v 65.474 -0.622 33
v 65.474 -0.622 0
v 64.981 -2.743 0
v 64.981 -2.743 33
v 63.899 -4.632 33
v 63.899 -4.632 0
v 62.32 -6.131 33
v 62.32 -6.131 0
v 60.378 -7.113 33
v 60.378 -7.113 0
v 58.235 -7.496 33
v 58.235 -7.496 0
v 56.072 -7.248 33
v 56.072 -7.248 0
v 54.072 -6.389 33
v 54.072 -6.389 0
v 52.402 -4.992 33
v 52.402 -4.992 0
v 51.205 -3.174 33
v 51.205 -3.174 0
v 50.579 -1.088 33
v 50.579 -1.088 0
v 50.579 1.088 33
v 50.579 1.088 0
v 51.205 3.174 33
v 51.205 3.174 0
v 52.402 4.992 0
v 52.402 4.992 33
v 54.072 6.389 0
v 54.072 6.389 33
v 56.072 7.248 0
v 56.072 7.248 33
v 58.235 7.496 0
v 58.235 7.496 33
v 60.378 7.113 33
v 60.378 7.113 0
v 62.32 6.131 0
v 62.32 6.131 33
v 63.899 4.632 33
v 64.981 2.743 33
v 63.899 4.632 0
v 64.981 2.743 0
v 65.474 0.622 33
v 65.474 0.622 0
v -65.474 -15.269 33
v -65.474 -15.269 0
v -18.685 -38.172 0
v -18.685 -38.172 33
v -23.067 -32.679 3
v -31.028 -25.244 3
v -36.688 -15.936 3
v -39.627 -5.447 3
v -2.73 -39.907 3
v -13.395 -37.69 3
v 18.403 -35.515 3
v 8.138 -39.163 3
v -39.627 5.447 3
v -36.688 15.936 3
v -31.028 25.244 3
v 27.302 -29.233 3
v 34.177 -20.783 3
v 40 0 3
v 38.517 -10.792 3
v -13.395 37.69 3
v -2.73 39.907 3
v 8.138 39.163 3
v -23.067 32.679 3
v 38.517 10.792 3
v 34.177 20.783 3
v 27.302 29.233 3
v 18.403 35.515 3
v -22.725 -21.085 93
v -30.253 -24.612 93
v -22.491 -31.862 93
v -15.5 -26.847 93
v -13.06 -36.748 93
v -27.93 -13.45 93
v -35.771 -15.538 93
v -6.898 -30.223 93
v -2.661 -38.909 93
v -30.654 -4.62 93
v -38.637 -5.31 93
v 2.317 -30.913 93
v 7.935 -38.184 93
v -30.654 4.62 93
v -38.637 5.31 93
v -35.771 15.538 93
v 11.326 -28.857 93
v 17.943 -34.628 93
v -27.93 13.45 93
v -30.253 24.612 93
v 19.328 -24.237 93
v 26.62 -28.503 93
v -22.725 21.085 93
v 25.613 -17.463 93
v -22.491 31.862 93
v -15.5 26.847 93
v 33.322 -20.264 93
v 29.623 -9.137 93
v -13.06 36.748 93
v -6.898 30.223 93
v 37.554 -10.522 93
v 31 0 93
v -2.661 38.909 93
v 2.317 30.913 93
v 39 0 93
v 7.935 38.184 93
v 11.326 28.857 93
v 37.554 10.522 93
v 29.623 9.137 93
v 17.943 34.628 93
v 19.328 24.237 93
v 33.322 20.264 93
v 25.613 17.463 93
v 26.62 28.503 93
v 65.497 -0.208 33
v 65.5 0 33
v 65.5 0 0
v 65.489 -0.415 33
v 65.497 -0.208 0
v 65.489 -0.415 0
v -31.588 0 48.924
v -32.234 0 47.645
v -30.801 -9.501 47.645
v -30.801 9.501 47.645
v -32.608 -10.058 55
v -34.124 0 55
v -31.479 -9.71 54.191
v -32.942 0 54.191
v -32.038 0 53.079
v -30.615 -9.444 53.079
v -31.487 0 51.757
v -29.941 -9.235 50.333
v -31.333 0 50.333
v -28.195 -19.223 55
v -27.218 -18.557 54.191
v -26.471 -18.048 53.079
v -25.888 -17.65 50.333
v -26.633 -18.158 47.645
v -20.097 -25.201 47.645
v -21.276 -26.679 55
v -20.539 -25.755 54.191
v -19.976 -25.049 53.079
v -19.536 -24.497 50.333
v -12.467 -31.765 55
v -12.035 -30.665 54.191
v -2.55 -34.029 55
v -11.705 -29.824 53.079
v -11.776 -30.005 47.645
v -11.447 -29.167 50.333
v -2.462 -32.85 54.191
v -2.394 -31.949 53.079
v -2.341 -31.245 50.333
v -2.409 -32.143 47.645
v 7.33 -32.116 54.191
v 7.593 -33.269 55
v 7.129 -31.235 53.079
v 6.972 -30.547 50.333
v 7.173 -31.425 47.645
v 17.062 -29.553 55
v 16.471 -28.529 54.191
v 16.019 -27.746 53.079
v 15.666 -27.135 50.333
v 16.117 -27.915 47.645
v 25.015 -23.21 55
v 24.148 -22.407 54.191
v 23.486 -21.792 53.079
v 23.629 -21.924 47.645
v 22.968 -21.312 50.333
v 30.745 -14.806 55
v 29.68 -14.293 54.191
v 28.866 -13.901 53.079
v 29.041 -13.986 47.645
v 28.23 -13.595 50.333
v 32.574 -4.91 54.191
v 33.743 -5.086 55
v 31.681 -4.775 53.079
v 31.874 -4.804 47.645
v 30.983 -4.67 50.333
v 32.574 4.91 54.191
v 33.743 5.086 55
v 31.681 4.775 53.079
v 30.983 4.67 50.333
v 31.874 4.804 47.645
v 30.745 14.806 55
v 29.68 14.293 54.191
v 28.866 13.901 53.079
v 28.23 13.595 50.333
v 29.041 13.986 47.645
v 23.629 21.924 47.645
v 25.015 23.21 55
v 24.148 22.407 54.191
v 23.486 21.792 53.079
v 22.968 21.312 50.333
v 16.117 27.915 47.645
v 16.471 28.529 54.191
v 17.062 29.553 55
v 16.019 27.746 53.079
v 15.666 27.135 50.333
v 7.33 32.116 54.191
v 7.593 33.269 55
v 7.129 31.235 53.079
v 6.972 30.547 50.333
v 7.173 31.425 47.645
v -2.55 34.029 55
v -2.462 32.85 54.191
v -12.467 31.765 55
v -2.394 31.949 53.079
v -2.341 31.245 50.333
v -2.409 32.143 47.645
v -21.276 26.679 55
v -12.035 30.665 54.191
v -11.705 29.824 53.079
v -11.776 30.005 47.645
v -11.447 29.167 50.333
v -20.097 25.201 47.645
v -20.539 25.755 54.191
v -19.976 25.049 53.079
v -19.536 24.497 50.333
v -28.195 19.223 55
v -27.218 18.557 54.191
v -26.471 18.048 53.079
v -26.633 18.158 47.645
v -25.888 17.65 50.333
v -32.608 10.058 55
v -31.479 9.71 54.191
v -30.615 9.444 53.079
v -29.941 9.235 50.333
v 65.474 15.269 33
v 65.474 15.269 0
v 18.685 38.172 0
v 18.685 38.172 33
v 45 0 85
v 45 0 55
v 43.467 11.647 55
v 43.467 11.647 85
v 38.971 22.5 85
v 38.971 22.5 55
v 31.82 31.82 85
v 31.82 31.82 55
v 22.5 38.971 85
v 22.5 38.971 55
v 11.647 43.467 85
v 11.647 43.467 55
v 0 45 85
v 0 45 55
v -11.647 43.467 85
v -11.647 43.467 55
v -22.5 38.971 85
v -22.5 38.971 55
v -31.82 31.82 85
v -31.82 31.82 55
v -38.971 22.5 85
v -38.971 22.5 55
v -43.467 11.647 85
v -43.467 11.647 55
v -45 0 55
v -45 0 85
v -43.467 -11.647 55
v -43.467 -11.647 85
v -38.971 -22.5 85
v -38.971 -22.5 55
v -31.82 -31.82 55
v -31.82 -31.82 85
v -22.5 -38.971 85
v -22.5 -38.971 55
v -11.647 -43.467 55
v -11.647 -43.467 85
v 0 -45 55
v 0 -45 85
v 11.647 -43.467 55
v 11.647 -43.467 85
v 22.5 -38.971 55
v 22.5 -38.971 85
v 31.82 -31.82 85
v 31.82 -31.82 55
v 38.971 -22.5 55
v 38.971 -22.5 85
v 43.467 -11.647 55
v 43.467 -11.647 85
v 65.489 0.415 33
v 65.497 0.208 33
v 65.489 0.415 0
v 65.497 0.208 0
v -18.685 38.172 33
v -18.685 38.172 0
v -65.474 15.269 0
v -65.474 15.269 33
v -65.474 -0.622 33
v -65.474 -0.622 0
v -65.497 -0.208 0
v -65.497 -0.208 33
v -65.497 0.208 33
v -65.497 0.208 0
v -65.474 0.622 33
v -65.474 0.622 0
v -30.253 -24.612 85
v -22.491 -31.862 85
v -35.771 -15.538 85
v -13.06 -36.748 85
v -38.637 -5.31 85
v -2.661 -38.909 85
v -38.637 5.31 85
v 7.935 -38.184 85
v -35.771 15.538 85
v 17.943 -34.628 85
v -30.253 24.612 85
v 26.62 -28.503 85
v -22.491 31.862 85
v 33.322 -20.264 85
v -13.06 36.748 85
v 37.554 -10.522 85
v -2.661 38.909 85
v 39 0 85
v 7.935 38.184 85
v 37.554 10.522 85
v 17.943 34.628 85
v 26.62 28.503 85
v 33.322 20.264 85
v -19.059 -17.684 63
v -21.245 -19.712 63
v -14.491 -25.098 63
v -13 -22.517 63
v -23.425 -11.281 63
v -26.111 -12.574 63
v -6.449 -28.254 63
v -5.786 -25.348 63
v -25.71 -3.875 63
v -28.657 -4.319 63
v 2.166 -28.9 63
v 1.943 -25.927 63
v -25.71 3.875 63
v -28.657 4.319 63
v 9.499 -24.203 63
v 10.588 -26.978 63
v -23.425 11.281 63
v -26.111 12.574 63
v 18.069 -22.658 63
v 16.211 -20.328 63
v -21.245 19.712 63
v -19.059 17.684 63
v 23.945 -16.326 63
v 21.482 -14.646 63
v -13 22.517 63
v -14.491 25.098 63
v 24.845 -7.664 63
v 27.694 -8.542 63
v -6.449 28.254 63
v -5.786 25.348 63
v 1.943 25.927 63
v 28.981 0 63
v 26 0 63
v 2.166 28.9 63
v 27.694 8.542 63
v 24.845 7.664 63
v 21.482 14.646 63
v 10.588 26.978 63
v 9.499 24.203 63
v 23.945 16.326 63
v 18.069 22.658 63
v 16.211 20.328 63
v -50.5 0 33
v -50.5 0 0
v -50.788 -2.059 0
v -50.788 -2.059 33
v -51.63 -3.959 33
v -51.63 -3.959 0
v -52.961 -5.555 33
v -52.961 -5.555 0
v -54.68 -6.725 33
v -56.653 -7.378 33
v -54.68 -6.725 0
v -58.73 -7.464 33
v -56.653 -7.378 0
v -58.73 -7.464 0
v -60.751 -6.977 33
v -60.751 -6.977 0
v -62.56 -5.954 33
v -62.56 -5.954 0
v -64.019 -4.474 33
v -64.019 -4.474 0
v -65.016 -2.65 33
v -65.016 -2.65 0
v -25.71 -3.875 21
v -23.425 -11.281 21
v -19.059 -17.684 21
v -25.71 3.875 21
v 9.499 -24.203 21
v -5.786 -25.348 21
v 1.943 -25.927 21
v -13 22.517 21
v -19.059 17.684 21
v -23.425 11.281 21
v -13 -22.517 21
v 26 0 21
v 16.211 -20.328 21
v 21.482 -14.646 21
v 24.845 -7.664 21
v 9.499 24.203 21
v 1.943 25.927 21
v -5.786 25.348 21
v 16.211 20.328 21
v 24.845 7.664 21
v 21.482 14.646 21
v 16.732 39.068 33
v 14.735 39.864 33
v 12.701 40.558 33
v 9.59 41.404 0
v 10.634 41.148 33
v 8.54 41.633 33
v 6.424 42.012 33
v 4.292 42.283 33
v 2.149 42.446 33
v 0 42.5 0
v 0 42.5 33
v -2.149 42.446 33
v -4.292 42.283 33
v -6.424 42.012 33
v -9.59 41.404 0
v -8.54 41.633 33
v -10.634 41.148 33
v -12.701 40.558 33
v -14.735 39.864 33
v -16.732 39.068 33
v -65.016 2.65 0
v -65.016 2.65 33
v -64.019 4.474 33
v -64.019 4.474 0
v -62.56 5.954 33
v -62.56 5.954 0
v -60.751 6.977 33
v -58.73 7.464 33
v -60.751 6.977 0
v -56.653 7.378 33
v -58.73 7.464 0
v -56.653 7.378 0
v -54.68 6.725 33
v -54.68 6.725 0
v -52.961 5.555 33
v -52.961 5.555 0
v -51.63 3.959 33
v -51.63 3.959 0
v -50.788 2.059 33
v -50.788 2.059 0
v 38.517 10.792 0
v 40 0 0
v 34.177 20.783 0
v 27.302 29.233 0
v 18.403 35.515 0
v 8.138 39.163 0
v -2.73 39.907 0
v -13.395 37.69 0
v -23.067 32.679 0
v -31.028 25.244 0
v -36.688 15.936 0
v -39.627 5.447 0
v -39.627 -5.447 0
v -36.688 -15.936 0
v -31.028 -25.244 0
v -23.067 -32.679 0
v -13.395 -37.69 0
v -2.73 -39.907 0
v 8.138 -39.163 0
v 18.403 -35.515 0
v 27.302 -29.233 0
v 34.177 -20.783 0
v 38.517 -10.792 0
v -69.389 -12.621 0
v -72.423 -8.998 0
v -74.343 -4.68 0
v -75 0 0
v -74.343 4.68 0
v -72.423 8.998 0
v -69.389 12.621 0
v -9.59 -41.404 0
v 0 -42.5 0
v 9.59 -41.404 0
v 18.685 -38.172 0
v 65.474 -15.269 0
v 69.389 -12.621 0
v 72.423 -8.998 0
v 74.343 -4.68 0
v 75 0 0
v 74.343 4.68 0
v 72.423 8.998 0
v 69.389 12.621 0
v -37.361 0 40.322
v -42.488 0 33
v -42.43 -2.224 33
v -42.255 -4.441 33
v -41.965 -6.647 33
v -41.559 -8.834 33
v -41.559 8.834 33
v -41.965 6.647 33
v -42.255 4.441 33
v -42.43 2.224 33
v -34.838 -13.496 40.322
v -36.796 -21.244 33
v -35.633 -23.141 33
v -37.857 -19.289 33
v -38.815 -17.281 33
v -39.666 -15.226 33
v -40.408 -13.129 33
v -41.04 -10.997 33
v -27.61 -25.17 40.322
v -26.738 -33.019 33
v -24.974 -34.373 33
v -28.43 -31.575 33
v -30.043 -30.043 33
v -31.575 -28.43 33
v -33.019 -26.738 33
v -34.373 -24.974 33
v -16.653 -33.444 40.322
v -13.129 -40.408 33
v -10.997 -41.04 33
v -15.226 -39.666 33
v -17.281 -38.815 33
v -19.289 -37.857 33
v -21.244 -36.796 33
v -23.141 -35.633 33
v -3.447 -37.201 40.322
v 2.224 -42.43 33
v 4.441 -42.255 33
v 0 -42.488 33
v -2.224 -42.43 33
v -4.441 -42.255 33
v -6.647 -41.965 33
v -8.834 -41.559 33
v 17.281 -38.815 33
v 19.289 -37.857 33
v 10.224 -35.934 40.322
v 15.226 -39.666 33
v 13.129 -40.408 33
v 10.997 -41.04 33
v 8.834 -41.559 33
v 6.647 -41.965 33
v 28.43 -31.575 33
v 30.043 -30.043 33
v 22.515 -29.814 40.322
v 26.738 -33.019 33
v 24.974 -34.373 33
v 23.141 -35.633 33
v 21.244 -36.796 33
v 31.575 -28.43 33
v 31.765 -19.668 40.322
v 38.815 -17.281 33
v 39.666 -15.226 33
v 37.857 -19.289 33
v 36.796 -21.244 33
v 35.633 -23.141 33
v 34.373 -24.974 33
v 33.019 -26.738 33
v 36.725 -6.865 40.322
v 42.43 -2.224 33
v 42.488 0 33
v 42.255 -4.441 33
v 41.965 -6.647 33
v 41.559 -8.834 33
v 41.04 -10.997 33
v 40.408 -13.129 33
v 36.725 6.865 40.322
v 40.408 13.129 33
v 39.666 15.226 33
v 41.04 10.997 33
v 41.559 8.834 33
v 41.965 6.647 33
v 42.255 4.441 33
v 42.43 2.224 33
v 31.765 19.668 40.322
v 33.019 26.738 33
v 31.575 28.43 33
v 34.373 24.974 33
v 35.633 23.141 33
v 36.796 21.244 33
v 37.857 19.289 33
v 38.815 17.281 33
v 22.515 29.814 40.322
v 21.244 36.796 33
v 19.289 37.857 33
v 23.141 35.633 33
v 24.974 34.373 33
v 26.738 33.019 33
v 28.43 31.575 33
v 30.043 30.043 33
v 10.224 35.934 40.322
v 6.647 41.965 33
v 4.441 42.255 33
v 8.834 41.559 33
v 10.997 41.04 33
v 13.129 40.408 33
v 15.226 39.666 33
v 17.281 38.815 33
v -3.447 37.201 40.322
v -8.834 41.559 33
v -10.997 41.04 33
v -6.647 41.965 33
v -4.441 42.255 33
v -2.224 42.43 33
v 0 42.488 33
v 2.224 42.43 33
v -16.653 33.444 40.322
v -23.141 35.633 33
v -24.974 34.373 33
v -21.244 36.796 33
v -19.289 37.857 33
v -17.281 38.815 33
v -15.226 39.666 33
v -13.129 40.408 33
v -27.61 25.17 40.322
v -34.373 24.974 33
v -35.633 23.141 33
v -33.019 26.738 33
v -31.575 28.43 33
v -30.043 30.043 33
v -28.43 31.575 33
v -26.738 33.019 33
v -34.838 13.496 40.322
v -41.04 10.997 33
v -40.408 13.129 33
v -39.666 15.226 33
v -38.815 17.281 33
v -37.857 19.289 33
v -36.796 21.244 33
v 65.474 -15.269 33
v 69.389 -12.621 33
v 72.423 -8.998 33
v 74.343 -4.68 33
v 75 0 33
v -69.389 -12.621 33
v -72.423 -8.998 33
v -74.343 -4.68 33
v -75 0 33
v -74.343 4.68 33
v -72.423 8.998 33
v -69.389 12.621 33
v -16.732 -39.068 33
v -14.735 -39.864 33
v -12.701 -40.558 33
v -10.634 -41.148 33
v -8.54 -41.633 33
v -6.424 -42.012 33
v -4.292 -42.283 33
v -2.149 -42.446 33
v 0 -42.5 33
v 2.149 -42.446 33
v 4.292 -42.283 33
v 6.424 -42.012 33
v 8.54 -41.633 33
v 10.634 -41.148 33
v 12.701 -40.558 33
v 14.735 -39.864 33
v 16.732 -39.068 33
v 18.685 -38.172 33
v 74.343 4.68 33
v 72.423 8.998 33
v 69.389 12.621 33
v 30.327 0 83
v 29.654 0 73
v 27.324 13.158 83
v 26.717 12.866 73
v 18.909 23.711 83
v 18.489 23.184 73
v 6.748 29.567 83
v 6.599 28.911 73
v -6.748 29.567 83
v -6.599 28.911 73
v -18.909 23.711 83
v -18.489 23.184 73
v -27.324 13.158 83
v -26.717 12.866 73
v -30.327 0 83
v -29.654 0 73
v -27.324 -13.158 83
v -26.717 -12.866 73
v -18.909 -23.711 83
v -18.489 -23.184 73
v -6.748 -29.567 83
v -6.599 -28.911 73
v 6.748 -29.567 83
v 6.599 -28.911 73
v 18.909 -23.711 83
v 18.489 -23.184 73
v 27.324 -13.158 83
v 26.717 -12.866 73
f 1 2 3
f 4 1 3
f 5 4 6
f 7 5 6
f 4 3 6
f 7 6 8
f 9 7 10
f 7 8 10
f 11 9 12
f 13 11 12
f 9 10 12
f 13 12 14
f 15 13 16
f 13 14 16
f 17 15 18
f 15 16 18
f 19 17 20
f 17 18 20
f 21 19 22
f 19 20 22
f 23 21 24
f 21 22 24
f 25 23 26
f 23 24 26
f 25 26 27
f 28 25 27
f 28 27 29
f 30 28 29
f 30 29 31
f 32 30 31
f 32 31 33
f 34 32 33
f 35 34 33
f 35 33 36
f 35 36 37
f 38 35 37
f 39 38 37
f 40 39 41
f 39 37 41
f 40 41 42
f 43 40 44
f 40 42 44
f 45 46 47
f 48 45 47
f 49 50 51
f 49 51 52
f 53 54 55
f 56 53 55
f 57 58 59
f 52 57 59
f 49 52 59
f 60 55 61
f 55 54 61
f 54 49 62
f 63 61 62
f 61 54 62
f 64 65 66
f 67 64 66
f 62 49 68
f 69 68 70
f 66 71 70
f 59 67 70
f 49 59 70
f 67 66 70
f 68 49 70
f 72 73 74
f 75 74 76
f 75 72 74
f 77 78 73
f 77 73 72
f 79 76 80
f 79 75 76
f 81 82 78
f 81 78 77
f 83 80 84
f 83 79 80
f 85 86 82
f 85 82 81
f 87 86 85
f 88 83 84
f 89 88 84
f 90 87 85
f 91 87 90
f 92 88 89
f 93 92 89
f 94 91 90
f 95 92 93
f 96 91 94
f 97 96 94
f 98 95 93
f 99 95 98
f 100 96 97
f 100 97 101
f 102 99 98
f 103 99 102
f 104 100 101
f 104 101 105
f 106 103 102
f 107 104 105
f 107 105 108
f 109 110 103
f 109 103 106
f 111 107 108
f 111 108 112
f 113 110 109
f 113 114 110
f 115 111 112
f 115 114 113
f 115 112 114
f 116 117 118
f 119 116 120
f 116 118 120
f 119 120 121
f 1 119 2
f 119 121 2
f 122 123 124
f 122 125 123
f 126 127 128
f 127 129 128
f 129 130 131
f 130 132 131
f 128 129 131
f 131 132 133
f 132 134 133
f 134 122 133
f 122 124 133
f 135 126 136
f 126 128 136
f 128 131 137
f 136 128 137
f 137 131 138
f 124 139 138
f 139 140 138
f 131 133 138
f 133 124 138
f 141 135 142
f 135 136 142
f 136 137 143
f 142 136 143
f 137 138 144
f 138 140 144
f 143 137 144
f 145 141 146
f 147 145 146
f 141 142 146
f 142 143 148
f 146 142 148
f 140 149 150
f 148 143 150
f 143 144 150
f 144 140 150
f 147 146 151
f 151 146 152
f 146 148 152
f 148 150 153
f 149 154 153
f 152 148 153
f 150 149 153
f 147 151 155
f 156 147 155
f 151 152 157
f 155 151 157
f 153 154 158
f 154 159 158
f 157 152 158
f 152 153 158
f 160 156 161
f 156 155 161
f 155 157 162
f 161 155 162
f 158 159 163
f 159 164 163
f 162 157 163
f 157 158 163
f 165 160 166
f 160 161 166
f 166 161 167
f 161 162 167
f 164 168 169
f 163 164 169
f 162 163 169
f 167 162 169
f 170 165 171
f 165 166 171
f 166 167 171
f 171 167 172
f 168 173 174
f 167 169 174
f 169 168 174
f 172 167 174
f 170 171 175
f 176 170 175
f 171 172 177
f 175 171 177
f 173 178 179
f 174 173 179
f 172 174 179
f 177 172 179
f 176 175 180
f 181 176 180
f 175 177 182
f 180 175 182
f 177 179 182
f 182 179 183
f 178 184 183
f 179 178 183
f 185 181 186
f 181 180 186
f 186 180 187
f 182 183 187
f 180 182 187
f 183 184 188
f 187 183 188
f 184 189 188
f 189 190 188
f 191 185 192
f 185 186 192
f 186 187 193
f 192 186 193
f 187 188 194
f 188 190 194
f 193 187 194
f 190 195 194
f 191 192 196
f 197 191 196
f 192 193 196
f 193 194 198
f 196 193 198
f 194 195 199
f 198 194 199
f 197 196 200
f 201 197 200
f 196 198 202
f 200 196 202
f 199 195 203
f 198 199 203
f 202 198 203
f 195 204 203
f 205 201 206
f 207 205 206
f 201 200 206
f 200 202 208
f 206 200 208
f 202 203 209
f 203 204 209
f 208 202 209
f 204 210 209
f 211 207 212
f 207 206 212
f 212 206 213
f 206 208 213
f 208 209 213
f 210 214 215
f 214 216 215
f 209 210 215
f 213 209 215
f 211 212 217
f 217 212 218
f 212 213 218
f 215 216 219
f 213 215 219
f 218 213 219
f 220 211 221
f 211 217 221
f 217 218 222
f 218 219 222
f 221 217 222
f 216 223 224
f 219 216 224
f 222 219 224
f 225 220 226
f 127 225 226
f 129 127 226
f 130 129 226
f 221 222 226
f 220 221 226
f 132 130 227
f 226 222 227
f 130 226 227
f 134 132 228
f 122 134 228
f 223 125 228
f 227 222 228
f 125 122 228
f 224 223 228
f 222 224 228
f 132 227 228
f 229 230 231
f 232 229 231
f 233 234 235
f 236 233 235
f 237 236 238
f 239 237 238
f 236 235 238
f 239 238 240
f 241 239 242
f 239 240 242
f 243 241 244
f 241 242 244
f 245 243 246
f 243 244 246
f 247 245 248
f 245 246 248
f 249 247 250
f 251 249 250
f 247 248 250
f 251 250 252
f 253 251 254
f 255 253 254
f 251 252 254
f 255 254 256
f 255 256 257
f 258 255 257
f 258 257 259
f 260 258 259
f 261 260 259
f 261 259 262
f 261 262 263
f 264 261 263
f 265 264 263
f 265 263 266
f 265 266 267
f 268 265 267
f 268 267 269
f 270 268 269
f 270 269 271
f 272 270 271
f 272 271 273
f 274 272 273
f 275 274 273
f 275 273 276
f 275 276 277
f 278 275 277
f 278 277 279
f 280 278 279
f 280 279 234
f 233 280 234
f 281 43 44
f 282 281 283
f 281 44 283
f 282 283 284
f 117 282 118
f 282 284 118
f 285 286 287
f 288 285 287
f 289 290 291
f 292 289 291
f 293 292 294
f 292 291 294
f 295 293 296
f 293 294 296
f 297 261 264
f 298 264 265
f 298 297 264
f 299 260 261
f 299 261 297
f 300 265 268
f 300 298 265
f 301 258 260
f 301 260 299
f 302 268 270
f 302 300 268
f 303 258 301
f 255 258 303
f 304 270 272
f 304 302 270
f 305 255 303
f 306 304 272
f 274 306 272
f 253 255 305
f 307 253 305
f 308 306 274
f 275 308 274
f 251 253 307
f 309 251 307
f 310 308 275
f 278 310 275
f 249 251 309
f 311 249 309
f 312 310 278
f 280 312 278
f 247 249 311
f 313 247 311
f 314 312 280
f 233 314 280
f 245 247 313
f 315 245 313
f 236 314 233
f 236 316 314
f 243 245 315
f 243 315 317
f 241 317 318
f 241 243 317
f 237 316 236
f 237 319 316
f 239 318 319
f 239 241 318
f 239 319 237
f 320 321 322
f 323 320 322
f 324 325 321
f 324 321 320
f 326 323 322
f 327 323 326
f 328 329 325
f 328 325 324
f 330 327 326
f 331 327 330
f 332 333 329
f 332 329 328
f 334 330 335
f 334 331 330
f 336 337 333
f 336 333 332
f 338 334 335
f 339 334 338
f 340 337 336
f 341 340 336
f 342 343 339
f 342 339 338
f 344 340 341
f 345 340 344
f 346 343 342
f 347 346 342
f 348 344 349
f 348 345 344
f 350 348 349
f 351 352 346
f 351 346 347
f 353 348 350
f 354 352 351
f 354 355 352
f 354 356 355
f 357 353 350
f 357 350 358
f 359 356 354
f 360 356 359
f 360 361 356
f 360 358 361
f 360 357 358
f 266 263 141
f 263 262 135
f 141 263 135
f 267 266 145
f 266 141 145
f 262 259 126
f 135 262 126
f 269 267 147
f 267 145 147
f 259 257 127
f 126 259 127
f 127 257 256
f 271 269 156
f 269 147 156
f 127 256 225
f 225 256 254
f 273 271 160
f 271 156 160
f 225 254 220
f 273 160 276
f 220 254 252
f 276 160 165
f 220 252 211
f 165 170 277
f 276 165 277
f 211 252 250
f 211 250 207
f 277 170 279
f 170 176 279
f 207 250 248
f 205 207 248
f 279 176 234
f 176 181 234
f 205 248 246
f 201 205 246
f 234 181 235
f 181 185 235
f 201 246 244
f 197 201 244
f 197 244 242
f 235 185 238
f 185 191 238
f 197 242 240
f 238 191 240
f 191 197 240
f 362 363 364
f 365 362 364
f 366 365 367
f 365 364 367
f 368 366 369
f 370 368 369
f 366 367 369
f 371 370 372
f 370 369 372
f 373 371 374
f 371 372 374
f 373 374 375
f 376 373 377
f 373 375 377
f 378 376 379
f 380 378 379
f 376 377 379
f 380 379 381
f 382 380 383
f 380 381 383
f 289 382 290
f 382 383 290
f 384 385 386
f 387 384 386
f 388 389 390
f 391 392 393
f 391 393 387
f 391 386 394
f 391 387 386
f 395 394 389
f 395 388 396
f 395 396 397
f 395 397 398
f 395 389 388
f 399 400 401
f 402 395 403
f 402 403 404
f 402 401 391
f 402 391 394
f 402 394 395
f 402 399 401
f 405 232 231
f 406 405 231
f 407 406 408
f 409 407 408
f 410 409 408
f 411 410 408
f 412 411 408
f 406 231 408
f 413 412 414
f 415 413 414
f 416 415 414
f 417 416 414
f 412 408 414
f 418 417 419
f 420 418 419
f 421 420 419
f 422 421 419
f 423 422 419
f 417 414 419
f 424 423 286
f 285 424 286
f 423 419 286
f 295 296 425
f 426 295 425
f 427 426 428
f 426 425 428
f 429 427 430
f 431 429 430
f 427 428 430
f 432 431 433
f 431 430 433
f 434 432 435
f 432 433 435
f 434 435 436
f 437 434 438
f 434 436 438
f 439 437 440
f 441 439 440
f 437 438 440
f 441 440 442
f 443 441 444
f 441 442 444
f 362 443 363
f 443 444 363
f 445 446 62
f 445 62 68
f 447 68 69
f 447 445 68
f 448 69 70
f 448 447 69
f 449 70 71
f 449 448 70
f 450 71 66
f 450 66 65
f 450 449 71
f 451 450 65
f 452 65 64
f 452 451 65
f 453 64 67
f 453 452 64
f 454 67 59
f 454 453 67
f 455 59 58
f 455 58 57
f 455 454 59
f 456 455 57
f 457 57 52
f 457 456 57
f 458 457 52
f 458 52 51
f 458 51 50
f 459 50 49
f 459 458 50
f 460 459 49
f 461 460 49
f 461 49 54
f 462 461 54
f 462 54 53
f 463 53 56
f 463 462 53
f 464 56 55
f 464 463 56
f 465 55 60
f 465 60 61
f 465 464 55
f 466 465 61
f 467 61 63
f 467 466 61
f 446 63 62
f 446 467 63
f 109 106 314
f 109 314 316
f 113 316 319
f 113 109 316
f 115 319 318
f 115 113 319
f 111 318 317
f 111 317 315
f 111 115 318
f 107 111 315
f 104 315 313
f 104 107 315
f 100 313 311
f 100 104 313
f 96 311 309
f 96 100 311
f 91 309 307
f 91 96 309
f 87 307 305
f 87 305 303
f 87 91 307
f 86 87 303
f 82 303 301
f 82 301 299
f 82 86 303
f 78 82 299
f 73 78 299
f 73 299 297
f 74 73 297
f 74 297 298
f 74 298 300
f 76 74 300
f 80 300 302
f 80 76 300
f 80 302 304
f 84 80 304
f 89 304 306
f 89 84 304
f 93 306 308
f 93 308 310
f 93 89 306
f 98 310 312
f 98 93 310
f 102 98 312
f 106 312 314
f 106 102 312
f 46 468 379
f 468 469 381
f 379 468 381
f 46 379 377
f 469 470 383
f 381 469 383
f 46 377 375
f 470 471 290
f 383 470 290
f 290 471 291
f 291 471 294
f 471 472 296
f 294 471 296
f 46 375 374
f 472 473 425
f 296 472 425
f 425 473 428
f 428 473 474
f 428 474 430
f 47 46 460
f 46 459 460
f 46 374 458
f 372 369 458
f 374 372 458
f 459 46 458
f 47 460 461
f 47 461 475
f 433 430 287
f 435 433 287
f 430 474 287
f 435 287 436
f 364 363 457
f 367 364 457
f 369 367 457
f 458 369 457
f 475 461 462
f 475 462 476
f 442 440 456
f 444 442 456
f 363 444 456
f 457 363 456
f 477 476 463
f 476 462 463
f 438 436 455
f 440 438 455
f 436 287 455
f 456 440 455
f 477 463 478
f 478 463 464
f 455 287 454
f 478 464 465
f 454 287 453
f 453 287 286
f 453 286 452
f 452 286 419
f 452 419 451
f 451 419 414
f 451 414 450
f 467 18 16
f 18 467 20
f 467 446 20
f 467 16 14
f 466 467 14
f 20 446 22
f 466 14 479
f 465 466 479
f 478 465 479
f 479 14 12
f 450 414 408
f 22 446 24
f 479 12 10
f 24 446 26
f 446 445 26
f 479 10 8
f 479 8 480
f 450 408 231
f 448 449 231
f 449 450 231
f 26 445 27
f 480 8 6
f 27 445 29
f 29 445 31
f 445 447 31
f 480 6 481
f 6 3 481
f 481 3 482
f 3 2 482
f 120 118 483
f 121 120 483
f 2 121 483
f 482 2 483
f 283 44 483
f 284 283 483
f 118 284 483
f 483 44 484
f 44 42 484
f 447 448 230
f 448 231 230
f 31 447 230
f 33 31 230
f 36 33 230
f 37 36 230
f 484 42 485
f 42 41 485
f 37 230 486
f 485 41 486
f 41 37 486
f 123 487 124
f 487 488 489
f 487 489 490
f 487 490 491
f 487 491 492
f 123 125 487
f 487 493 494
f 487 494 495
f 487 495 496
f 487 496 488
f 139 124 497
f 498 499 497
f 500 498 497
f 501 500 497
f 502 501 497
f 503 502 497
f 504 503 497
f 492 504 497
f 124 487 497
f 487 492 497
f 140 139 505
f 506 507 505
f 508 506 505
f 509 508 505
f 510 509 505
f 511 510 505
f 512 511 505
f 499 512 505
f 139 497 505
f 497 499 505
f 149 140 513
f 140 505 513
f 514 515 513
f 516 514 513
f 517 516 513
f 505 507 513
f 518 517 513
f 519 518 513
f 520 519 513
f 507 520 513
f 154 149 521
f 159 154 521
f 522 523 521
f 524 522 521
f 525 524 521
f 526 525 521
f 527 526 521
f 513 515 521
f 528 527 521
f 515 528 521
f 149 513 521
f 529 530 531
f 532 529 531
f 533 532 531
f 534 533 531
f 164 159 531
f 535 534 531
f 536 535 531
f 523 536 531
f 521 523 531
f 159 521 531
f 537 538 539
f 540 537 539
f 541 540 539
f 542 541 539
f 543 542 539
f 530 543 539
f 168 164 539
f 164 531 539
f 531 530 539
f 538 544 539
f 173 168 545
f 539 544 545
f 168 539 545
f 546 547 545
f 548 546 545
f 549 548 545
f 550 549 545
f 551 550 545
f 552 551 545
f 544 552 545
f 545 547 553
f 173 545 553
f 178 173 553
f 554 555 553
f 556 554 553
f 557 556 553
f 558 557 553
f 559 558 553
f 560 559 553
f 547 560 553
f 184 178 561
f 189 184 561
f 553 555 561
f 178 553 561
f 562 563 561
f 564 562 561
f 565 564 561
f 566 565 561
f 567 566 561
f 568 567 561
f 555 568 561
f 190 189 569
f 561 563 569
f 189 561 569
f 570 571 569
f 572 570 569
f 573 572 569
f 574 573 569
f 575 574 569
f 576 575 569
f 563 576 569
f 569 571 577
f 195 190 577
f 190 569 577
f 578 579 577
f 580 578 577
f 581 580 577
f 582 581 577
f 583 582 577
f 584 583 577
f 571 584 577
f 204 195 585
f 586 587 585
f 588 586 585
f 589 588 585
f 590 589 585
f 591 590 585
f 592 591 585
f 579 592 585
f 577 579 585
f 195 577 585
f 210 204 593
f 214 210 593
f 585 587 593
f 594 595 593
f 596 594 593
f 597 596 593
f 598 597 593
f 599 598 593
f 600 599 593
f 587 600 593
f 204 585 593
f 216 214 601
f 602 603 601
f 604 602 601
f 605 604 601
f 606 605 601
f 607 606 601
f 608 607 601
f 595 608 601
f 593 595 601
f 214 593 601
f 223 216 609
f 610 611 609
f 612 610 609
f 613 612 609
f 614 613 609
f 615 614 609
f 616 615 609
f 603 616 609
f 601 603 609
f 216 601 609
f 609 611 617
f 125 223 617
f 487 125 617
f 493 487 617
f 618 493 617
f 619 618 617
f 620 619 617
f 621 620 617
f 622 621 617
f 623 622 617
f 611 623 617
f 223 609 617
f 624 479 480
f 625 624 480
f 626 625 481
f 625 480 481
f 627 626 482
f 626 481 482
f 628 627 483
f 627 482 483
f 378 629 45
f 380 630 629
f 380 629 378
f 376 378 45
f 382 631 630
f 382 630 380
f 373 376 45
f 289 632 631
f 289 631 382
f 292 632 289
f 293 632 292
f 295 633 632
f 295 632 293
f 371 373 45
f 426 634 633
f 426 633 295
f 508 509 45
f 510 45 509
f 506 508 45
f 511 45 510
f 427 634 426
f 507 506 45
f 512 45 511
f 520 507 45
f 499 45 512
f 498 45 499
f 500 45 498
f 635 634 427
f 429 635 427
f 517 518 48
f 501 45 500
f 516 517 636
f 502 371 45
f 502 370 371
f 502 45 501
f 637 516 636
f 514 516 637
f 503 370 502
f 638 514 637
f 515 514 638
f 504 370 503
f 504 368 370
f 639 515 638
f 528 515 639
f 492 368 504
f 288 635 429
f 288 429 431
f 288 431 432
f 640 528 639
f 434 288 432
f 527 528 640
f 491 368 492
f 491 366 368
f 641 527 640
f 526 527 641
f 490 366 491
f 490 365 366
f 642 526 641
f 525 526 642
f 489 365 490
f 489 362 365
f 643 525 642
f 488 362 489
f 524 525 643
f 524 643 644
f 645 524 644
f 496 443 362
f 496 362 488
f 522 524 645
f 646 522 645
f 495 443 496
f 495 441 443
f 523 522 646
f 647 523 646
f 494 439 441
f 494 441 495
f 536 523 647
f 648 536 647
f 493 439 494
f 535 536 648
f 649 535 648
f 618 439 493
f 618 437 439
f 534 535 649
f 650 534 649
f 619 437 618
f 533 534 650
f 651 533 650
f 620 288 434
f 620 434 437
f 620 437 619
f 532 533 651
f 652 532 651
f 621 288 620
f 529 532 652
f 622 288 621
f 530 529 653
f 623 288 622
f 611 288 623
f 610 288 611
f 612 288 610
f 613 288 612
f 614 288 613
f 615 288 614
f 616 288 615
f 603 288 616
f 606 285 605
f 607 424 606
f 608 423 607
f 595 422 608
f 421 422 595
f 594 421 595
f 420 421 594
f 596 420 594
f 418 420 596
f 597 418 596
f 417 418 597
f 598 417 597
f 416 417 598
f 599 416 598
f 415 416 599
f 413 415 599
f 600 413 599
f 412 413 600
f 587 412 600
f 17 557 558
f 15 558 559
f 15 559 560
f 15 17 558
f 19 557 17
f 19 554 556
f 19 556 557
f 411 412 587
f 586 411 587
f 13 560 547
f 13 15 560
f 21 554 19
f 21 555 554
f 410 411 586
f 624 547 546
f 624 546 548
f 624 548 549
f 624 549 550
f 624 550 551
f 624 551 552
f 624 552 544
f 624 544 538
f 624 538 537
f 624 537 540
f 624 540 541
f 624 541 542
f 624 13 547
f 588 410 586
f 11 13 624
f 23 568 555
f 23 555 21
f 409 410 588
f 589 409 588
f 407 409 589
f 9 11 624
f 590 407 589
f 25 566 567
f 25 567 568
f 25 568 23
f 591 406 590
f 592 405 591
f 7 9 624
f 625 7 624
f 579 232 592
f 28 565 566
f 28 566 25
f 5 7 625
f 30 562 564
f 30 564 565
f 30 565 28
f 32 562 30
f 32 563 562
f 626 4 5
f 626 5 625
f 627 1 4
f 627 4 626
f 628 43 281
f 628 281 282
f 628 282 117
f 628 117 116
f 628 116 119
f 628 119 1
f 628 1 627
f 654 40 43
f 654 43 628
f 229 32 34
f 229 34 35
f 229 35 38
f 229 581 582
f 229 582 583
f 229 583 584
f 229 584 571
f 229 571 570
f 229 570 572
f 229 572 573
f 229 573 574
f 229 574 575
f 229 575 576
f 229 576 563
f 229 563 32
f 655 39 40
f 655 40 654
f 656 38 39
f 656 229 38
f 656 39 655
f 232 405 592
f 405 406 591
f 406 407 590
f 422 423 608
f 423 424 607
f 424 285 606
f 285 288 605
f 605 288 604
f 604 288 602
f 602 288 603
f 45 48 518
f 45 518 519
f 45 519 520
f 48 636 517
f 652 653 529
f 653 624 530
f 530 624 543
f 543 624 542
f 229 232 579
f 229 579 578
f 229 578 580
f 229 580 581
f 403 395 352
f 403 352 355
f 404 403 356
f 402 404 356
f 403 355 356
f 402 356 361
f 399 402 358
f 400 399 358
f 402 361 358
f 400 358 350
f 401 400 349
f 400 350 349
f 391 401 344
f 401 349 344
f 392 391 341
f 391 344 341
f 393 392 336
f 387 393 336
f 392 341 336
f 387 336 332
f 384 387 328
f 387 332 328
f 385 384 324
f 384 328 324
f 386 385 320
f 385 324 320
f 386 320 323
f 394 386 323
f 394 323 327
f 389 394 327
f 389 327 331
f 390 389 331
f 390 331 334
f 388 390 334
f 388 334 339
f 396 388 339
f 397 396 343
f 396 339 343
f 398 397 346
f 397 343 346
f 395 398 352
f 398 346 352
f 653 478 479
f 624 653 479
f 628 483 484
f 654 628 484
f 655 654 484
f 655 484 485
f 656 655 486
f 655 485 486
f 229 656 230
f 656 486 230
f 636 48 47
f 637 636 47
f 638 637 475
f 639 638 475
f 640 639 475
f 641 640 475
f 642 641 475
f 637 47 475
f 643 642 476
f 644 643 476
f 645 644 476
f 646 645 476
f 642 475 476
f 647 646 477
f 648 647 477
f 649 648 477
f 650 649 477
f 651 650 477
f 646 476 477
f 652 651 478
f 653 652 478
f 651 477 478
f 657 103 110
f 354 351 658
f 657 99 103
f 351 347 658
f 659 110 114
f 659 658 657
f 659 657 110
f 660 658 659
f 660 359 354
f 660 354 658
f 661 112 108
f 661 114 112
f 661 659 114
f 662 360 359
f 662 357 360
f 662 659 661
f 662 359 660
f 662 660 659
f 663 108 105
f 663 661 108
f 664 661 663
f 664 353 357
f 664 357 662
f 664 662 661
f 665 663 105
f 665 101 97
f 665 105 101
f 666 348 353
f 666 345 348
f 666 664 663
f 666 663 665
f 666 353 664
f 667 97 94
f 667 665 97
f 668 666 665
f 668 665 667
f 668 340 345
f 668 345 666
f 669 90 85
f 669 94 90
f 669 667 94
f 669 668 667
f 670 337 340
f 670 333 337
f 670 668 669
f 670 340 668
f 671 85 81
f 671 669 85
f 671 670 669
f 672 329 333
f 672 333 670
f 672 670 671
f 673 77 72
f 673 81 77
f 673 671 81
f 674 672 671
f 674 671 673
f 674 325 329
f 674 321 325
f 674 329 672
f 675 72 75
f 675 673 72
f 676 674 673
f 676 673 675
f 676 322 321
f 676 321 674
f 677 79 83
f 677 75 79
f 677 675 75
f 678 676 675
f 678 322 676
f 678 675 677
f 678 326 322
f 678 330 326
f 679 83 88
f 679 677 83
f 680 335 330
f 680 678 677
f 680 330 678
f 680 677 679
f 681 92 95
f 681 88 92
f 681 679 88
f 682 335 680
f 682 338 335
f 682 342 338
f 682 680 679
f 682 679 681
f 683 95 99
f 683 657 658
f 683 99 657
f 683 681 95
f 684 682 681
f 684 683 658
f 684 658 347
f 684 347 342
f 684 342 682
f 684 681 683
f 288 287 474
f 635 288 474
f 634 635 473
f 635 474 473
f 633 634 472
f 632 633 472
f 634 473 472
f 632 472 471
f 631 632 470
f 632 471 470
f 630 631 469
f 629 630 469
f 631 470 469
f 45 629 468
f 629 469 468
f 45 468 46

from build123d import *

# Parameters (mm, degrees)
F1_DEPTH  = 33
F3_R      = 40
F4_DEPTH  = 3
F6_R      = 45
F6_R_2    = 34.1243185103
F7_DEPTH  = 38
F8_R      = 45
F8_R_2    = 39
F9_DEPTH  = 8
F10_R     = 31
F11_DEPTH = 30
F11_TAPER = 3.85
F12_R     = 26
F13_DEPTH = 42


with BuildPart() as f1:
    # F0 (on Top) → F1 (new body)
    with BuildSketch(Plane.XY):
        with BuildLine():
            ThreePointArc((-42.0797413793, -5.9619934125), (-42.5, 0), (-42.0797413793, 5.9619934125))
            ThreePointArc((-42.0797413793, 5.9619934125), (-51.7160080676, 15.7959312924), (-65.474137931, 15.2688330329))
            Line((-65.474137931, 15.2688330329), (-65.474137931, 0.6223039353))
            ThreePointArc((-65.474137931, 0.6223039353), (-57.6885794505, 7.4935316935), (-50.5, 0))
            ThreePointArc((-50.5, 0), (-57.6885794505, -7.4935316935), (-65.474137931, -0.6223039353))
            Line((-65.474137931, -0.6223039353), (-65.474137931, -15.2688330329))
            ThreePointArc((-65.474137931, -15.2688330329), (-51.7160080676, -15.7959312924), (-42.0797413793, -5.9619934125))
        make_face()
        with BuildLine():
            ThreePointArc((-18.6853448276, -38.1720825824), (-34.3870816807, -24.9755603237), (-42.0797413793, -5.9619934125))
            ThreePointArc((-42.0797413793, -5.9619934125), (-51.7160080676, -15.7959312924), (-65.474137931, -15.2688330329))
            Line((-65.474137931, -15.2688330329), (-18.6853448276, -38.1720825824))
        make_face()
        with BuildLine():
            Line((-65.474137931, 0.6223039353), (-65.474137931, 15.2688330329))
            ThreePointArc((-65.474137931, 15.2688330329), (-75, 0), (-65.474137931, -15.2688330329))
            Line((-65.474137931, -15.2688330329), (-65.474137931, -0.6223039353))
            ThreePointArc((-65.474137931, -0.6223039353), (-65.5, 0), (-65.474137931, 0.6223039353))
        make_face()
        with BuildLine():
            Line((65.474137931, 15.2688330329), (18.6853448276, 38.1720825824))
            ThreePointArc((18.6853448276, 38.1720825824), (34.3870816807, 24.9755603237), (42.0797413793, 5.9619934125))
            ThreePointArc((42.0797413793, 5.9619934125), (51.7160080676, 15.7959312924), (65.474137931, 15.2688330329))
        make_face()
        with BuildLine():
            ThreePointArc((75, 0), (72.4232511042, 8.9983235987), (65.474137931, 15.2688330329))
            Line((65.474137931, 15.2688330329), (65.474137931, 0.6223039353))
            ThreePointArc((65.474137931, 0.6223039353), (65.4935316935, 0.3114205495), (65.5, 0))
            ThreePointArc((65.5, 0), (65.4935316935, -0.3114205495), (65.474137931, -0.6223039353))
            Line((65.474137931, -0.6223039353), (65.474137931, -15.2688330329))
            ThreePointArc((65.474137931, -15.2688330329), (72.4232511042, -8.9983235987), (75, 0))
        make_face()
        with BuildLine():
            ThreePointArc((42.0797413793, 5.9619934125), (34.3870816807, 24.9755603237), (18.6853448276, 38.1720825824))
            ThreePointArc((18.6853448276, 38.1720825824), (0, 42.5), (-18.6853448276, 38.1720825824))
            ThreePointArc((-18.6853448276, 38.1720825824), (-34.3870816807, 24.9755603237), (-42.0797413793, 5.9619934125))
            ThreePointArc((-42.0797413793, 5.9619934125), (-41.2721131557, 3.0294886902), (-41, 0))
            ThreePointArc((-41, 0), (-41.2721131557, -3.0294886902), (-42.0797413793, -5.9619934125))
            ThreePointArc((-42.0797413793, -5.9619934125), (-34.3870816807, -24.9755603237), (-18.6853448276, -38.1720825824))
            ThreePointArc((-18.6853448276, -38.1720825824), (0, -42.5), (18.6853448276, -38.1720825824))
            ThreePointArc((18.6853448276, -38.1720825824), (34.3870816807, -24.9755603237), (42.0797413793, -5.9619934125))
            ThreePointArc((42.0797413793, -5.9619934125), (41, 0), (42.0797413793, 5.9619934125))
        make_face()
        with BuildLine():
            ThreePointArc((42.5, 0), (42.3948051571, 2.9883934965), (42.0797413793, 5.9619934125))
            ThreePointArc((42.0797413793, 5.9619934125), (41, 0), (42.0797413793, -5.9619934125))
            ThreePointArc((42.0797413793, -5.9619934125), (42.3948051571, -2.9883934965), (42.5, 0))
        make_face()
        with BuildLine():
            ThreePointArc((65.474137931, 15.2688330329), (51.7160080676, 15.7959312924), (42.0797413793, 5.9619934125))
            ThreePointArc((42.0797413793, 5.9619934125), (42.3948051571, 2.9883934965), (42.5, 0))
            ThreePointArc((42.5, 0), (42.3948051571, -2.9883934965), (42.0797413793, -5.9619934125))
            ThreePointArc((42.0797413793, -5.9619934125), (51.7160080676, -15.7959312924), (65.474137931, -15.2688330329))
            Line((65.474137931, -15.2688330329), (65.474137931, -0.6223039353))
            ThreePointArc((65.474137931, -0.6223039353), (50.5, 0), (65.474137931, 0.6223039353))
            Line((65.474137931, 0.6223039353), (65.474137931, 15.2688330329))
        make_face()
        with BuildLine():
            ThreePointArc((65.474137931, -15.2688330329), (51.7160080676, -15.7959312924), (42.0797413793, -5.9619934125))
            ThreePointArc((42.0797413793, -5.9619934125), (34.3870816807, -24.9755603237), (18.6853448276, -38.1720825824))
            Line((18.6853448276, -38.1720825824), (65.474137931, -15.2688330329))
        make_face()
        with BuildLine():
            ThreePointArc((-42.0797413793, 5.9619934125), (-34.3870816807, 24.9755603237), (-18.6853448276, 38.1720825824))
            Line((-18.6853448276, 38.1720825824), (-65.474137931, 15.2688330329))
            ThreePointArc((-65.474137931, 15.2688330329), (-51.7160080676, 15.7959312924), (-42.0797413793, 5.9619934125))
        make_face()
        with BuildLine():
            ThreePointArc((-41, 0), (-41.2721131557, 3.0294886902), (-42.0797413793, 5.9619934125))
            ThreePointArc((-42.0797413793, 5.9619934125), (-42.5, 0), (-42.0797413793, -5.9619934125))
            ThreePointArc((-42.0797413793, -5.9619934125), (-41.2721131557, -3.0294886902), (-41, 0))
        make_face()
    extrude(amount=F1_DEPTH)

    # F3 (on face) → F4 (cut)
    with BuildSketch(Plane.XY):
        Circle(F3_R)
    extrude(amount=F4_DEPTH, mode=Mode.SUBTRACT)

    # F2 (on Front) → F5 (revolve)
    with BuildSketch(Plane.XZ):
        with BuildLine():
            Line((-42.499996424, 32.9825655057), (0, 33))
            Line((0, 33), (0, 55))
            Line((0, 55), (-27.083222819, 55))
            Line((-27.083222819, 55), (-34.1243185103, 55))
            ThreePointArc((-34.1243185103, 55), (-31.4867427552, 51.7572794356), (-32.2335459741, 47.6445762521))
            Line((-32.2335459741, 47.6445762521), (-42.499996424, 32.9825655057))
        make_face()
    revolve(axis=Axis((0, 0, 44), (0, 0, 1)))

    # F6 (on face) → F7 (join)
    with BuildSketch(Plane.XY.offset(55)):
        Circle(F6_R)
        Circle(F6_R_2, mode=Mode.SUBTRACT)
        Circle(F6_R_2)
    extrude(amount=F7_DEPTH)

    # F8 (on face) → F9 (cut)
    with BuildSketch(Plane.XY.offset(93)):
        Circle(F8_R)
        Circle(F8_R_2, mode=Mode.SUBTRACT)
    extrude(amount=-F9_DEPTH, mode=Mode.SUBTRACT)

    # F10 (on face) → F11 (cut)
    with BuildSketch(Plane.XY.offset(93)):
        Circle(F10_R)
    extrude(amount=-F11_DEPTH, taper=F11_TAPER, mode=Mode.SUBTRACT)

    # F12 (on face) → F13 (cut)
    with BuildSketch(Plane.XY.offset(63)):
        Circle(F12_R)
    extrude(amount=-F13_DEPTH, mode=Mode.SUBTRACT)


solid = f1.part
